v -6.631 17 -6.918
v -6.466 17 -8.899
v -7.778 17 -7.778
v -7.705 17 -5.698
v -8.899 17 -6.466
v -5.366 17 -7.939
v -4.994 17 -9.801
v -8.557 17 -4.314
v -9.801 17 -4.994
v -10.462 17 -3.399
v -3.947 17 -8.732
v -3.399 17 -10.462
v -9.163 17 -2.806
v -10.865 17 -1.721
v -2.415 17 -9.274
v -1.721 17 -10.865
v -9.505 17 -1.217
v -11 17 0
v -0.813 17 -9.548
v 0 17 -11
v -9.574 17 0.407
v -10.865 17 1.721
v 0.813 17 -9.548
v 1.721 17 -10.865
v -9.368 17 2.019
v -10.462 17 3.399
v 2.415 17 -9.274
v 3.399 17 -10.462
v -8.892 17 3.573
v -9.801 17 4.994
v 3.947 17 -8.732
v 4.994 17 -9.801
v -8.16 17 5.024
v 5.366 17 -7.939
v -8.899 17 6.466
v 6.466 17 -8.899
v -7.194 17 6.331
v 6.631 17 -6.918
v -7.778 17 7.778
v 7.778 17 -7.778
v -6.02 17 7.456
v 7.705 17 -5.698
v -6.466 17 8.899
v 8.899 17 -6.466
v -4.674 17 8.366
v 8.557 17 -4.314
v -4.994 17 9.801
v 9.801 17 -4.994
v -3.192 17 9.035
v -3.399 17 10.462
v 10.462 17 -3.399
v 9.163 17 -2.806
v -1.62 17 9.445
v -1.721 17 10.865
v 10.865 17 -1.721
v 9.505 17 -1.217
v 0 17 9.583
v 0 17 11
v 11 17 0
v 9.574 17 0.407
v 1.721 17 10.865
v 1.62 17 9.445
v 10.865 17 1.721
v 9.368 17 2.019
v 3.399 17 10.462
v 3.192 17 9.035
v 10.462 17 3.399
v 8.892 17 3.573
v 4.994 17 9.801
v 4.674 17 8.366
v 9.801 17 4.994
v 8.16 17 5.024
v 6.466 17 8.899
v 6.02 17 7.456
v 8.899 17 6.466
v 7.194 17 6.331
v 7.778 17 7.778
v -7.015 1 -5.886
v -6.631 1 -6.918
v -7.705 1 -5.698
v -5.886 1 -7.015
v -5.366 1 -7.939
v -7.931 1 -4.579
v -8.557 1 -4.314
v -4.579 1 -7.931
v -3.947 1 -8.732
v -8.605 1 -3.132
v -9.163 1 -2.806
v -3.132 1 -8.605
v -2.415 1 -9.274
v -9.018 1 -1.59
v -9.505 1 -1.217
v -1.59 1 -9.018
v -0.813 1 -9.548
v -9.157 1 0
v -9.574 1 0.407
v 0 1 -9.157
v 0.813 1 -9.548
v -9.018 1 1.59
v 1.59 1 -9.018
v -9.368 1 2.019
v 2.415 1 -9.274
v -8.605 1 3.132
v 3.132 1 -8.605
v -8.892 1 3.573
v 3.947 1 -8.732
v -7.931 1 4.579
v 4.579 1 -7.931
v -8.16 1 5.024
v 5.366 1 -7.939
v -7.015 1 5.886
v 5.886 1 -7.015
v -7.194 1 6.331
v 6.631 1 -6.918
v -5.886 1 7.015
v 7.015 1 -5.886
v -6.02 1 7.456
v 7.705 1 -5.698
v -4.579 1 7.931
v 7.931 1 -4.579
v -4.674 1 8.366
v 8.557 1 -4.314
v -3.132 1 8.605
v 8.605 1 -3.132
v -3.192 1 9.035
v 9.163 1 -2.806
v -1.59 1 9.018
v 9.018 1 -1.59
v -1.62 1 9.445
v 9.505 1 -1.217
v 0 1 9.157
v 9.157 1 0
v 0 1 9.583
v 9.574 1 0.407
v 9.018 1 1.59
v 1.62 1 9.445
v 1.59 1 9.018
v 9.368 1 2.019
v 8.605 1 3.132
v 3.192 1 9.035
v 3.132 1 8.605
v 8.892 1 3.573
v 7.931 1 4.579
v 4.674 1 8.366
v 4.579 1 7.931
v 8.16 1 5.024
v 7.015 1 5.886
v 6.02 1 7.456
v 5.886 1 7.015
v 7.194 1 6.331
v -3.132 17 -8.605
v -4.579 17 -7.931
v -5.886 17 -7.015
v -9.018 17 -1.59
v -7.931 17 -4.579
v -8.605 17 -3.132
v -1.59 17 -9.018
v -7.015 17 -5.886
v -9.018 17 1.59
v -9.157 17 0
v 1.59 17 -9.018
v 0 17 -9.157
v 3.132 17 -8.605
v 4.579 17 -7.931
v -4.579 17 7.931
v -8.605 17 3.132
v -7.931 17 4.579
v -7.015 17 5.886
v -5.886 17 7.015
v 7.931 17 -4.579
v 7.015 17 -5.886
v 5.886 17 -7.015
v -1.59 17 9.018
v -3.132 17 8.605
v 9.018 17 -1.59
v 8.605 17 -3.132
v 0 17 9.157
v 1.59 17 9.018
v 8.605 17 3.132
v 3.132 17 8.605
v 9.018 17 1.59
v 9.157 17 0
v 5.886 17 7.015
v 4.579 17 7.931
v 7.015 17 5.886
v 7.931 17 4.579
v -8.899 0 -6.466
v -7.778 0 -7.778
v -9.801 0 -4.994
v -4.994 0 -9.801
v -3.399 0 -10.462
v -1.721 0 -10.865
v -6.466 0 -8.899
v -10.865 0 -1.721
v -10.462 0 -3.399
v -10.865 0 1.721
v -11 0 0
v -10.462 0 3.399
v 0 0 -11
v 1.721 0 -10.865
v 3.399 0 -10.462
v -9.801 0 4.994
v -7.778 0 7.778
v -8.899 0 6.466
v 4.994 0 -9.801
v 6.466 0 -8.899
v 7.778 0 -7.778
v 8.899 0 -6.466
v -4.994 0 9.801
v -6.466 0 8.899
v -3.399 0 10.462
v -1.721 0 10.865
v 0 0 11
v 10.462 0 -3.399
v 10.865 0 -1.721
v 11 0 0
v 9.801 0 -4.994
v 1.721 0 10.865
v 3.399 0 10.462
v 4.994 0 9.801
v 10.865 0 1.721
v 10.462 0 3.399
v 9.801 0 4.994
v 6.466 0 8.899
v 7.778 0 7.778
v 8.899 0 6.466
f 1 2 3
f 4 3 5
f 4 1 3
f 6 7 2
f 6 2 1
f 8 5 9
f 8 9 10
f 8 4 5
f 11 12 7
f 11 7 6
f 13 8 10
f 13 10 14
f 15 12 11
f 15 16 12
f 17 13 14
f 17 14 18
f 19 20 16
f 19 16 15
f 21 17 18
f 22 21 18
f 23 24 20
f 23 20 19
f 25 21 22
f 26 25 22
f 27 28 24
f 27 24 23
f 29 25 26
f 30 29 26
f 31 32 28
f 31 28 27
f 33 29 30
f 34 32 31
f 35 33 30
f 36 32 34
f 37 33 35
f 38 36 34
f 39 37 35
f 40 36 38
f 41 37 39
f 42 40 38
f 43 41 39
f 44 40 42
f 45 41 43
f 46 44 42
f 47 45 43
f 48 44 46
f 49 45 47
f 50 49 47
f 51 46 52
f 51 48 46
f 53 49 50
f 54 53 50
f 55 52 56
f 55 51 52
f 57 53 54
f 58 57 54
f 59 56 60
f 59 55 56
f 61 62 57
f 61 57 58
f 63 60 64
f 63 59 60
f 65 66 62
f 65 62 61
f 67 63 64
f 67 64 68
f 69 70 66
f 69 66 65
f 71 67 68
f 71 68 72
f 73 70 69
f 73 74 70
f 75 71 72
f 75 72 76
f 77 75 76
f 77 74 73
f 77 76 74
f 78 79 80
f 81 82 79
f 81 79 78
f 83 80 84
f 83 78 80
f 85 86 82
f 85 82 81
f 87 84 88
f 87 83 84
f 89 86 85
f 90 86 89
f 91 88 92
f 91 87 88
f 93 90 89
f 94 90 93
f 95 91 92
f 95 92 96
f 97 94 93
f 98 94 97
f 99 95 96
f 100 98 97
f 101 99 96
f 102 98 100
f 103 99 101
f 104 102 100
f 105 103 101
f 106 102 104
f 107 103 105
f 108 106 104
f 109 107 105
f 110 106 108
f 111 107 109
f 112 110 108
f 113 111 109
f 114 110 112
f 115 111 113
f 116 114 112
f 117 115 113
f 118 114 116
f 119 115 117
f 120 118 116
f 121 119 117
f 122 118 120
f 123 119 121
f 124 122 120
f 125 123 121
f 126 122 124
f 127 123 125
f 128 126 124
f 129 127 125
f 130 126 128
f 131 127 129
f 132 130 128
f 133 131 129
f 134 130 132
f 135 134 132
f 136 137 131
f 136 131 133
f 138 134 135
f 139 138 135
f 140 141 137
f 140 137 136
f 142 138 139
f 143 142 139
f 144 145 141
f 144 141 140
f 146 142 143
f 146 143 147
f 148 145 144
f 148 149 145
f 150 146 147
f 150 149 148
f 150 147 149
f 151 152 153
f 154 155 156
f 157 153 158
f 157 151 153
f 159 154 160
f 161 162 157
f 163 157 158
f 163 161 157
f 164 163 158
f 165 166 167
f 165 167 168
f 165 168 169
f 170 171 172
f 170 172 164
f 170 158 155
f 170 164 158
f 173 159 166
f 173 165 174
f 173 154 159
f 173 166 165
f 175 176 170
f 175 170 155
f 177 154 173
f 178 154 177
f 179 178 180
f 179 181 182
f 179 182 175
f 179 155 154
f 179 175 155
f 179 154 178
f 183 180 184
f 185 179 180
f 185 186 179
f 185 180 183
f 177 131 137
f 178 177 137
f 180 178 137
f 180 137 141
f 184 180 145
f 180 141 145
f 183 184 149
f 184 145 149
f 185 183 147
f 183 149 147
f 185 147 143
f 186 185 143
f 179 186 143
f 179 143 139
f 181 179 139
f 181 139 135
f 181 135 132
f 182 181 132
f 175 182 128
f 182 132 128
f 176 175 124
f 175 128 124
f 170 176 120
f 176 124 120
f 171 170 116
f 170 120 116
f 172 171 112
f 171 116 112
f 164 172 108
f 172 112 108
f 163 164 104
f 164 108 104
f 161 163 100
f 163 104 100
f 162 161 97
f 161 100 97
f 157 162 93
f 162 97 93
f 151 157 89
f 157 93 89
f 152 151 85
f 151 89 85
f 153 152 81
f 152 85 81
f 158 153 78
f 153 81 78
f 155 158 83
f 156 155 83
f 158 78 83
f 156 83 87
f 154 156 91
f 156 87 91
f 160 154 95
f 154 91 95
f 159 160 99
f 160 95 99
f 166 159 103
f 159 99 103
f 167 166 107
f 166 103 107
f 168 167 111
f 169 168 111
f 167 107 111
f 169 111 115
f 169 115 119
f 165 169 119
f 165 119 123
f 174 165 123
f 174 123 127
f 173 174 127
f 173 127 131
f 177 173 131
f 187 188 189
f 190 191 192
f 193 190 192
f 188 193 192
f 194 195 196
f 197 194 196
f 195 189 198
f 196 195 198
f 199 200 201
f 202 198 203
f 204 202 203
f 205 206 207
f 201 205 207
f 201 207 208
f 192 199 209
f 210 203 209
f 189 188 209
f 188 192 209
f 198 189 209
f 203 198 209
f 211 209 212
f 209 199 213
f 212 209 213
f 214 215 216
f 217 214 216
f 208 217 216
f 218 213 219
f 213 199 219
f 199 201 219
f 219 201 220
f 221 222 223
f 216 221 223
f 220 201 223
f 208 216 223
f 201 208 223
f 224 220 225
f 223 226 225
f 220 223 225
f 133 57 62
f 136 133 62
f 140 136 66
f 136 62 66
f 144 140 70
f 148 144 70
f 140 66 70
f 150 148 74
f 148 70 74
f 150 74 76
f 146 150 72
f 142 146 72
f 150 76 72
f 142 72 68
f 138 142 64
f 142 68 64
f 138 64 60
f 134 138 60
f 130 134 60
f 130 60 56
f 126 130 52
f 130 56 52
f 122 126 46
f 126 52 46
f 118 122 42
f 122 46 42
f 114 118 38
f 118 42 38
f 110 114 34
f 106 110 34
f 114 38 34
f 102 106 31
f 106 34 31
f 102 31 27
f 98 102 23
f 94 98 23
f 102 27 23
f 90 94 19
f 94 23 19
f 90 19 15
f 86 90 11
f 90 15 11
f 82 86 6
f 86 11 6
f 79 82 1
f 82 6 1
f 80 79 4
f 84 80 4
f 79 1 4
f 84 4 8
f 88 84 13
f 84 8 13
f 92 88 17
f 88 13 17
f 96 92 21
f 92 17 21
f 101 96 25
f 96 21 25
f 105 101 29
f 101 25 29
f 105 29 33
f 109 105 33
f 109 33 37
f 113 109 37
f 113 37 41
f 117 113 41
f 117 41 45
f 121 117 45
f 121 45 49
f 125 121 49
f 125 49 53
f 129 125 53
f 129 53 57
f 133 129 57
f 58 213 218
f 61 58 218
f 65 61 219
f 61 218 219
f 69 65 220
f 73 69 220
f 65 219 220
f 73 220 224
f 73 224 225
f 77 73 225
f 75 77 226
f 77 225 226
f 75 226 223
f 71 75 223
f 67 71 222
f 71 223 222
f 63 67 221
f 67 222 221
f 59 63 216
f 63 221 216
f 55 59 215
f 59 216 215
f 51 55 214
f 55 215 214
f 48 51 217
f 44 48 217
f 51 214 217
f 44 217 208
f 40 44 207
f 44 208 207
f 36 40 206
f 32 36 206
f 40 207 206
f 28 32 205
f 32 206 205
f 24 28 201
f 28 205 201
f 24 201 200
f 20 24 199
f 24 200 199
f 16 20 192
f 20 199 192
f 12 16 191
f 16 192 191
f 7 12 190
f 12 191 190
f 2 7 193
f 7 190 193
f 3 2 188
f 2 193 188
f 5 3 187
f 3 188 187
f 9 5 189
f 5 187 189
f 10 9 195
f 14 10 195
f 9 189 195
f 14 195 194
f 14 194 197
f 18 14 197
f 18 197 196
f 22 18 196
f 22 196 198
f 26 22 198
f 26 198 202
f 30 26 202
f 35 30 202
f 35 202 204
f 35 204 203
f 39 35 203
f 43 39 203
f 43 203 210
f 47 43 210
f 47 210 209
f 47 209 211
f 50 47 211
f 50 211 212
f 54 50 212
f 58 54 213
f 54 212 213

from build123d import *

# Parameters (mm, degrees)
SKETCH_1_R          = 11
EXTRUDE_1_DEPTH     = 17
SKETCH_2_R          = 9.582864225
CUT_EXTRUDE_1_DEPTH = 16
SKETCH_3_R          = 9.157454318
EXTRUDE_2_DEPTH     = 16


with BuildPart() as part:
    # 草图1 → 凸台-拉伸1 (new body)
    with BuildSketch(Plane(origin=(0, 0, 0), x_dir=(1, 0, 0), z_dir=(0, 1, 0))):
        with Locations(Location((0, 0, 0), (0, 0, 270))):
            Circle(SKETCH_1_R)
    extrude(amount=EXTRUDE_1_DEPTH)

    # 草图2 → 切除-拉伸1 (cut)
    with BuildSketch(Plane(origin=(0, 17, 0), x_dir=(1, 0, 0), z_dir=(0, 1, 0))):
        with Locations(Location((0, 0, 0), (0, 0, 270))):
            Circle(SKETCH_2_R)
    extrude(amount=-CUT_EXTRUDE_1_DEPTH, mode=Mode.SUBTRACT)

    # 草图3 → 凸台-拉伸2 (add)
    with BuildSketch(Plane(origin=(0, 1, 0), x_dir=(1, 0, 0), z_dir=(0, 1, 0))):
        with Locations(Location((0, 0, 0), (0, 0, 270))):
            Circle(SKETCH_3_R)
    extrude(amount=EXTRUDE_2_DEPTH)


solid = part.part
